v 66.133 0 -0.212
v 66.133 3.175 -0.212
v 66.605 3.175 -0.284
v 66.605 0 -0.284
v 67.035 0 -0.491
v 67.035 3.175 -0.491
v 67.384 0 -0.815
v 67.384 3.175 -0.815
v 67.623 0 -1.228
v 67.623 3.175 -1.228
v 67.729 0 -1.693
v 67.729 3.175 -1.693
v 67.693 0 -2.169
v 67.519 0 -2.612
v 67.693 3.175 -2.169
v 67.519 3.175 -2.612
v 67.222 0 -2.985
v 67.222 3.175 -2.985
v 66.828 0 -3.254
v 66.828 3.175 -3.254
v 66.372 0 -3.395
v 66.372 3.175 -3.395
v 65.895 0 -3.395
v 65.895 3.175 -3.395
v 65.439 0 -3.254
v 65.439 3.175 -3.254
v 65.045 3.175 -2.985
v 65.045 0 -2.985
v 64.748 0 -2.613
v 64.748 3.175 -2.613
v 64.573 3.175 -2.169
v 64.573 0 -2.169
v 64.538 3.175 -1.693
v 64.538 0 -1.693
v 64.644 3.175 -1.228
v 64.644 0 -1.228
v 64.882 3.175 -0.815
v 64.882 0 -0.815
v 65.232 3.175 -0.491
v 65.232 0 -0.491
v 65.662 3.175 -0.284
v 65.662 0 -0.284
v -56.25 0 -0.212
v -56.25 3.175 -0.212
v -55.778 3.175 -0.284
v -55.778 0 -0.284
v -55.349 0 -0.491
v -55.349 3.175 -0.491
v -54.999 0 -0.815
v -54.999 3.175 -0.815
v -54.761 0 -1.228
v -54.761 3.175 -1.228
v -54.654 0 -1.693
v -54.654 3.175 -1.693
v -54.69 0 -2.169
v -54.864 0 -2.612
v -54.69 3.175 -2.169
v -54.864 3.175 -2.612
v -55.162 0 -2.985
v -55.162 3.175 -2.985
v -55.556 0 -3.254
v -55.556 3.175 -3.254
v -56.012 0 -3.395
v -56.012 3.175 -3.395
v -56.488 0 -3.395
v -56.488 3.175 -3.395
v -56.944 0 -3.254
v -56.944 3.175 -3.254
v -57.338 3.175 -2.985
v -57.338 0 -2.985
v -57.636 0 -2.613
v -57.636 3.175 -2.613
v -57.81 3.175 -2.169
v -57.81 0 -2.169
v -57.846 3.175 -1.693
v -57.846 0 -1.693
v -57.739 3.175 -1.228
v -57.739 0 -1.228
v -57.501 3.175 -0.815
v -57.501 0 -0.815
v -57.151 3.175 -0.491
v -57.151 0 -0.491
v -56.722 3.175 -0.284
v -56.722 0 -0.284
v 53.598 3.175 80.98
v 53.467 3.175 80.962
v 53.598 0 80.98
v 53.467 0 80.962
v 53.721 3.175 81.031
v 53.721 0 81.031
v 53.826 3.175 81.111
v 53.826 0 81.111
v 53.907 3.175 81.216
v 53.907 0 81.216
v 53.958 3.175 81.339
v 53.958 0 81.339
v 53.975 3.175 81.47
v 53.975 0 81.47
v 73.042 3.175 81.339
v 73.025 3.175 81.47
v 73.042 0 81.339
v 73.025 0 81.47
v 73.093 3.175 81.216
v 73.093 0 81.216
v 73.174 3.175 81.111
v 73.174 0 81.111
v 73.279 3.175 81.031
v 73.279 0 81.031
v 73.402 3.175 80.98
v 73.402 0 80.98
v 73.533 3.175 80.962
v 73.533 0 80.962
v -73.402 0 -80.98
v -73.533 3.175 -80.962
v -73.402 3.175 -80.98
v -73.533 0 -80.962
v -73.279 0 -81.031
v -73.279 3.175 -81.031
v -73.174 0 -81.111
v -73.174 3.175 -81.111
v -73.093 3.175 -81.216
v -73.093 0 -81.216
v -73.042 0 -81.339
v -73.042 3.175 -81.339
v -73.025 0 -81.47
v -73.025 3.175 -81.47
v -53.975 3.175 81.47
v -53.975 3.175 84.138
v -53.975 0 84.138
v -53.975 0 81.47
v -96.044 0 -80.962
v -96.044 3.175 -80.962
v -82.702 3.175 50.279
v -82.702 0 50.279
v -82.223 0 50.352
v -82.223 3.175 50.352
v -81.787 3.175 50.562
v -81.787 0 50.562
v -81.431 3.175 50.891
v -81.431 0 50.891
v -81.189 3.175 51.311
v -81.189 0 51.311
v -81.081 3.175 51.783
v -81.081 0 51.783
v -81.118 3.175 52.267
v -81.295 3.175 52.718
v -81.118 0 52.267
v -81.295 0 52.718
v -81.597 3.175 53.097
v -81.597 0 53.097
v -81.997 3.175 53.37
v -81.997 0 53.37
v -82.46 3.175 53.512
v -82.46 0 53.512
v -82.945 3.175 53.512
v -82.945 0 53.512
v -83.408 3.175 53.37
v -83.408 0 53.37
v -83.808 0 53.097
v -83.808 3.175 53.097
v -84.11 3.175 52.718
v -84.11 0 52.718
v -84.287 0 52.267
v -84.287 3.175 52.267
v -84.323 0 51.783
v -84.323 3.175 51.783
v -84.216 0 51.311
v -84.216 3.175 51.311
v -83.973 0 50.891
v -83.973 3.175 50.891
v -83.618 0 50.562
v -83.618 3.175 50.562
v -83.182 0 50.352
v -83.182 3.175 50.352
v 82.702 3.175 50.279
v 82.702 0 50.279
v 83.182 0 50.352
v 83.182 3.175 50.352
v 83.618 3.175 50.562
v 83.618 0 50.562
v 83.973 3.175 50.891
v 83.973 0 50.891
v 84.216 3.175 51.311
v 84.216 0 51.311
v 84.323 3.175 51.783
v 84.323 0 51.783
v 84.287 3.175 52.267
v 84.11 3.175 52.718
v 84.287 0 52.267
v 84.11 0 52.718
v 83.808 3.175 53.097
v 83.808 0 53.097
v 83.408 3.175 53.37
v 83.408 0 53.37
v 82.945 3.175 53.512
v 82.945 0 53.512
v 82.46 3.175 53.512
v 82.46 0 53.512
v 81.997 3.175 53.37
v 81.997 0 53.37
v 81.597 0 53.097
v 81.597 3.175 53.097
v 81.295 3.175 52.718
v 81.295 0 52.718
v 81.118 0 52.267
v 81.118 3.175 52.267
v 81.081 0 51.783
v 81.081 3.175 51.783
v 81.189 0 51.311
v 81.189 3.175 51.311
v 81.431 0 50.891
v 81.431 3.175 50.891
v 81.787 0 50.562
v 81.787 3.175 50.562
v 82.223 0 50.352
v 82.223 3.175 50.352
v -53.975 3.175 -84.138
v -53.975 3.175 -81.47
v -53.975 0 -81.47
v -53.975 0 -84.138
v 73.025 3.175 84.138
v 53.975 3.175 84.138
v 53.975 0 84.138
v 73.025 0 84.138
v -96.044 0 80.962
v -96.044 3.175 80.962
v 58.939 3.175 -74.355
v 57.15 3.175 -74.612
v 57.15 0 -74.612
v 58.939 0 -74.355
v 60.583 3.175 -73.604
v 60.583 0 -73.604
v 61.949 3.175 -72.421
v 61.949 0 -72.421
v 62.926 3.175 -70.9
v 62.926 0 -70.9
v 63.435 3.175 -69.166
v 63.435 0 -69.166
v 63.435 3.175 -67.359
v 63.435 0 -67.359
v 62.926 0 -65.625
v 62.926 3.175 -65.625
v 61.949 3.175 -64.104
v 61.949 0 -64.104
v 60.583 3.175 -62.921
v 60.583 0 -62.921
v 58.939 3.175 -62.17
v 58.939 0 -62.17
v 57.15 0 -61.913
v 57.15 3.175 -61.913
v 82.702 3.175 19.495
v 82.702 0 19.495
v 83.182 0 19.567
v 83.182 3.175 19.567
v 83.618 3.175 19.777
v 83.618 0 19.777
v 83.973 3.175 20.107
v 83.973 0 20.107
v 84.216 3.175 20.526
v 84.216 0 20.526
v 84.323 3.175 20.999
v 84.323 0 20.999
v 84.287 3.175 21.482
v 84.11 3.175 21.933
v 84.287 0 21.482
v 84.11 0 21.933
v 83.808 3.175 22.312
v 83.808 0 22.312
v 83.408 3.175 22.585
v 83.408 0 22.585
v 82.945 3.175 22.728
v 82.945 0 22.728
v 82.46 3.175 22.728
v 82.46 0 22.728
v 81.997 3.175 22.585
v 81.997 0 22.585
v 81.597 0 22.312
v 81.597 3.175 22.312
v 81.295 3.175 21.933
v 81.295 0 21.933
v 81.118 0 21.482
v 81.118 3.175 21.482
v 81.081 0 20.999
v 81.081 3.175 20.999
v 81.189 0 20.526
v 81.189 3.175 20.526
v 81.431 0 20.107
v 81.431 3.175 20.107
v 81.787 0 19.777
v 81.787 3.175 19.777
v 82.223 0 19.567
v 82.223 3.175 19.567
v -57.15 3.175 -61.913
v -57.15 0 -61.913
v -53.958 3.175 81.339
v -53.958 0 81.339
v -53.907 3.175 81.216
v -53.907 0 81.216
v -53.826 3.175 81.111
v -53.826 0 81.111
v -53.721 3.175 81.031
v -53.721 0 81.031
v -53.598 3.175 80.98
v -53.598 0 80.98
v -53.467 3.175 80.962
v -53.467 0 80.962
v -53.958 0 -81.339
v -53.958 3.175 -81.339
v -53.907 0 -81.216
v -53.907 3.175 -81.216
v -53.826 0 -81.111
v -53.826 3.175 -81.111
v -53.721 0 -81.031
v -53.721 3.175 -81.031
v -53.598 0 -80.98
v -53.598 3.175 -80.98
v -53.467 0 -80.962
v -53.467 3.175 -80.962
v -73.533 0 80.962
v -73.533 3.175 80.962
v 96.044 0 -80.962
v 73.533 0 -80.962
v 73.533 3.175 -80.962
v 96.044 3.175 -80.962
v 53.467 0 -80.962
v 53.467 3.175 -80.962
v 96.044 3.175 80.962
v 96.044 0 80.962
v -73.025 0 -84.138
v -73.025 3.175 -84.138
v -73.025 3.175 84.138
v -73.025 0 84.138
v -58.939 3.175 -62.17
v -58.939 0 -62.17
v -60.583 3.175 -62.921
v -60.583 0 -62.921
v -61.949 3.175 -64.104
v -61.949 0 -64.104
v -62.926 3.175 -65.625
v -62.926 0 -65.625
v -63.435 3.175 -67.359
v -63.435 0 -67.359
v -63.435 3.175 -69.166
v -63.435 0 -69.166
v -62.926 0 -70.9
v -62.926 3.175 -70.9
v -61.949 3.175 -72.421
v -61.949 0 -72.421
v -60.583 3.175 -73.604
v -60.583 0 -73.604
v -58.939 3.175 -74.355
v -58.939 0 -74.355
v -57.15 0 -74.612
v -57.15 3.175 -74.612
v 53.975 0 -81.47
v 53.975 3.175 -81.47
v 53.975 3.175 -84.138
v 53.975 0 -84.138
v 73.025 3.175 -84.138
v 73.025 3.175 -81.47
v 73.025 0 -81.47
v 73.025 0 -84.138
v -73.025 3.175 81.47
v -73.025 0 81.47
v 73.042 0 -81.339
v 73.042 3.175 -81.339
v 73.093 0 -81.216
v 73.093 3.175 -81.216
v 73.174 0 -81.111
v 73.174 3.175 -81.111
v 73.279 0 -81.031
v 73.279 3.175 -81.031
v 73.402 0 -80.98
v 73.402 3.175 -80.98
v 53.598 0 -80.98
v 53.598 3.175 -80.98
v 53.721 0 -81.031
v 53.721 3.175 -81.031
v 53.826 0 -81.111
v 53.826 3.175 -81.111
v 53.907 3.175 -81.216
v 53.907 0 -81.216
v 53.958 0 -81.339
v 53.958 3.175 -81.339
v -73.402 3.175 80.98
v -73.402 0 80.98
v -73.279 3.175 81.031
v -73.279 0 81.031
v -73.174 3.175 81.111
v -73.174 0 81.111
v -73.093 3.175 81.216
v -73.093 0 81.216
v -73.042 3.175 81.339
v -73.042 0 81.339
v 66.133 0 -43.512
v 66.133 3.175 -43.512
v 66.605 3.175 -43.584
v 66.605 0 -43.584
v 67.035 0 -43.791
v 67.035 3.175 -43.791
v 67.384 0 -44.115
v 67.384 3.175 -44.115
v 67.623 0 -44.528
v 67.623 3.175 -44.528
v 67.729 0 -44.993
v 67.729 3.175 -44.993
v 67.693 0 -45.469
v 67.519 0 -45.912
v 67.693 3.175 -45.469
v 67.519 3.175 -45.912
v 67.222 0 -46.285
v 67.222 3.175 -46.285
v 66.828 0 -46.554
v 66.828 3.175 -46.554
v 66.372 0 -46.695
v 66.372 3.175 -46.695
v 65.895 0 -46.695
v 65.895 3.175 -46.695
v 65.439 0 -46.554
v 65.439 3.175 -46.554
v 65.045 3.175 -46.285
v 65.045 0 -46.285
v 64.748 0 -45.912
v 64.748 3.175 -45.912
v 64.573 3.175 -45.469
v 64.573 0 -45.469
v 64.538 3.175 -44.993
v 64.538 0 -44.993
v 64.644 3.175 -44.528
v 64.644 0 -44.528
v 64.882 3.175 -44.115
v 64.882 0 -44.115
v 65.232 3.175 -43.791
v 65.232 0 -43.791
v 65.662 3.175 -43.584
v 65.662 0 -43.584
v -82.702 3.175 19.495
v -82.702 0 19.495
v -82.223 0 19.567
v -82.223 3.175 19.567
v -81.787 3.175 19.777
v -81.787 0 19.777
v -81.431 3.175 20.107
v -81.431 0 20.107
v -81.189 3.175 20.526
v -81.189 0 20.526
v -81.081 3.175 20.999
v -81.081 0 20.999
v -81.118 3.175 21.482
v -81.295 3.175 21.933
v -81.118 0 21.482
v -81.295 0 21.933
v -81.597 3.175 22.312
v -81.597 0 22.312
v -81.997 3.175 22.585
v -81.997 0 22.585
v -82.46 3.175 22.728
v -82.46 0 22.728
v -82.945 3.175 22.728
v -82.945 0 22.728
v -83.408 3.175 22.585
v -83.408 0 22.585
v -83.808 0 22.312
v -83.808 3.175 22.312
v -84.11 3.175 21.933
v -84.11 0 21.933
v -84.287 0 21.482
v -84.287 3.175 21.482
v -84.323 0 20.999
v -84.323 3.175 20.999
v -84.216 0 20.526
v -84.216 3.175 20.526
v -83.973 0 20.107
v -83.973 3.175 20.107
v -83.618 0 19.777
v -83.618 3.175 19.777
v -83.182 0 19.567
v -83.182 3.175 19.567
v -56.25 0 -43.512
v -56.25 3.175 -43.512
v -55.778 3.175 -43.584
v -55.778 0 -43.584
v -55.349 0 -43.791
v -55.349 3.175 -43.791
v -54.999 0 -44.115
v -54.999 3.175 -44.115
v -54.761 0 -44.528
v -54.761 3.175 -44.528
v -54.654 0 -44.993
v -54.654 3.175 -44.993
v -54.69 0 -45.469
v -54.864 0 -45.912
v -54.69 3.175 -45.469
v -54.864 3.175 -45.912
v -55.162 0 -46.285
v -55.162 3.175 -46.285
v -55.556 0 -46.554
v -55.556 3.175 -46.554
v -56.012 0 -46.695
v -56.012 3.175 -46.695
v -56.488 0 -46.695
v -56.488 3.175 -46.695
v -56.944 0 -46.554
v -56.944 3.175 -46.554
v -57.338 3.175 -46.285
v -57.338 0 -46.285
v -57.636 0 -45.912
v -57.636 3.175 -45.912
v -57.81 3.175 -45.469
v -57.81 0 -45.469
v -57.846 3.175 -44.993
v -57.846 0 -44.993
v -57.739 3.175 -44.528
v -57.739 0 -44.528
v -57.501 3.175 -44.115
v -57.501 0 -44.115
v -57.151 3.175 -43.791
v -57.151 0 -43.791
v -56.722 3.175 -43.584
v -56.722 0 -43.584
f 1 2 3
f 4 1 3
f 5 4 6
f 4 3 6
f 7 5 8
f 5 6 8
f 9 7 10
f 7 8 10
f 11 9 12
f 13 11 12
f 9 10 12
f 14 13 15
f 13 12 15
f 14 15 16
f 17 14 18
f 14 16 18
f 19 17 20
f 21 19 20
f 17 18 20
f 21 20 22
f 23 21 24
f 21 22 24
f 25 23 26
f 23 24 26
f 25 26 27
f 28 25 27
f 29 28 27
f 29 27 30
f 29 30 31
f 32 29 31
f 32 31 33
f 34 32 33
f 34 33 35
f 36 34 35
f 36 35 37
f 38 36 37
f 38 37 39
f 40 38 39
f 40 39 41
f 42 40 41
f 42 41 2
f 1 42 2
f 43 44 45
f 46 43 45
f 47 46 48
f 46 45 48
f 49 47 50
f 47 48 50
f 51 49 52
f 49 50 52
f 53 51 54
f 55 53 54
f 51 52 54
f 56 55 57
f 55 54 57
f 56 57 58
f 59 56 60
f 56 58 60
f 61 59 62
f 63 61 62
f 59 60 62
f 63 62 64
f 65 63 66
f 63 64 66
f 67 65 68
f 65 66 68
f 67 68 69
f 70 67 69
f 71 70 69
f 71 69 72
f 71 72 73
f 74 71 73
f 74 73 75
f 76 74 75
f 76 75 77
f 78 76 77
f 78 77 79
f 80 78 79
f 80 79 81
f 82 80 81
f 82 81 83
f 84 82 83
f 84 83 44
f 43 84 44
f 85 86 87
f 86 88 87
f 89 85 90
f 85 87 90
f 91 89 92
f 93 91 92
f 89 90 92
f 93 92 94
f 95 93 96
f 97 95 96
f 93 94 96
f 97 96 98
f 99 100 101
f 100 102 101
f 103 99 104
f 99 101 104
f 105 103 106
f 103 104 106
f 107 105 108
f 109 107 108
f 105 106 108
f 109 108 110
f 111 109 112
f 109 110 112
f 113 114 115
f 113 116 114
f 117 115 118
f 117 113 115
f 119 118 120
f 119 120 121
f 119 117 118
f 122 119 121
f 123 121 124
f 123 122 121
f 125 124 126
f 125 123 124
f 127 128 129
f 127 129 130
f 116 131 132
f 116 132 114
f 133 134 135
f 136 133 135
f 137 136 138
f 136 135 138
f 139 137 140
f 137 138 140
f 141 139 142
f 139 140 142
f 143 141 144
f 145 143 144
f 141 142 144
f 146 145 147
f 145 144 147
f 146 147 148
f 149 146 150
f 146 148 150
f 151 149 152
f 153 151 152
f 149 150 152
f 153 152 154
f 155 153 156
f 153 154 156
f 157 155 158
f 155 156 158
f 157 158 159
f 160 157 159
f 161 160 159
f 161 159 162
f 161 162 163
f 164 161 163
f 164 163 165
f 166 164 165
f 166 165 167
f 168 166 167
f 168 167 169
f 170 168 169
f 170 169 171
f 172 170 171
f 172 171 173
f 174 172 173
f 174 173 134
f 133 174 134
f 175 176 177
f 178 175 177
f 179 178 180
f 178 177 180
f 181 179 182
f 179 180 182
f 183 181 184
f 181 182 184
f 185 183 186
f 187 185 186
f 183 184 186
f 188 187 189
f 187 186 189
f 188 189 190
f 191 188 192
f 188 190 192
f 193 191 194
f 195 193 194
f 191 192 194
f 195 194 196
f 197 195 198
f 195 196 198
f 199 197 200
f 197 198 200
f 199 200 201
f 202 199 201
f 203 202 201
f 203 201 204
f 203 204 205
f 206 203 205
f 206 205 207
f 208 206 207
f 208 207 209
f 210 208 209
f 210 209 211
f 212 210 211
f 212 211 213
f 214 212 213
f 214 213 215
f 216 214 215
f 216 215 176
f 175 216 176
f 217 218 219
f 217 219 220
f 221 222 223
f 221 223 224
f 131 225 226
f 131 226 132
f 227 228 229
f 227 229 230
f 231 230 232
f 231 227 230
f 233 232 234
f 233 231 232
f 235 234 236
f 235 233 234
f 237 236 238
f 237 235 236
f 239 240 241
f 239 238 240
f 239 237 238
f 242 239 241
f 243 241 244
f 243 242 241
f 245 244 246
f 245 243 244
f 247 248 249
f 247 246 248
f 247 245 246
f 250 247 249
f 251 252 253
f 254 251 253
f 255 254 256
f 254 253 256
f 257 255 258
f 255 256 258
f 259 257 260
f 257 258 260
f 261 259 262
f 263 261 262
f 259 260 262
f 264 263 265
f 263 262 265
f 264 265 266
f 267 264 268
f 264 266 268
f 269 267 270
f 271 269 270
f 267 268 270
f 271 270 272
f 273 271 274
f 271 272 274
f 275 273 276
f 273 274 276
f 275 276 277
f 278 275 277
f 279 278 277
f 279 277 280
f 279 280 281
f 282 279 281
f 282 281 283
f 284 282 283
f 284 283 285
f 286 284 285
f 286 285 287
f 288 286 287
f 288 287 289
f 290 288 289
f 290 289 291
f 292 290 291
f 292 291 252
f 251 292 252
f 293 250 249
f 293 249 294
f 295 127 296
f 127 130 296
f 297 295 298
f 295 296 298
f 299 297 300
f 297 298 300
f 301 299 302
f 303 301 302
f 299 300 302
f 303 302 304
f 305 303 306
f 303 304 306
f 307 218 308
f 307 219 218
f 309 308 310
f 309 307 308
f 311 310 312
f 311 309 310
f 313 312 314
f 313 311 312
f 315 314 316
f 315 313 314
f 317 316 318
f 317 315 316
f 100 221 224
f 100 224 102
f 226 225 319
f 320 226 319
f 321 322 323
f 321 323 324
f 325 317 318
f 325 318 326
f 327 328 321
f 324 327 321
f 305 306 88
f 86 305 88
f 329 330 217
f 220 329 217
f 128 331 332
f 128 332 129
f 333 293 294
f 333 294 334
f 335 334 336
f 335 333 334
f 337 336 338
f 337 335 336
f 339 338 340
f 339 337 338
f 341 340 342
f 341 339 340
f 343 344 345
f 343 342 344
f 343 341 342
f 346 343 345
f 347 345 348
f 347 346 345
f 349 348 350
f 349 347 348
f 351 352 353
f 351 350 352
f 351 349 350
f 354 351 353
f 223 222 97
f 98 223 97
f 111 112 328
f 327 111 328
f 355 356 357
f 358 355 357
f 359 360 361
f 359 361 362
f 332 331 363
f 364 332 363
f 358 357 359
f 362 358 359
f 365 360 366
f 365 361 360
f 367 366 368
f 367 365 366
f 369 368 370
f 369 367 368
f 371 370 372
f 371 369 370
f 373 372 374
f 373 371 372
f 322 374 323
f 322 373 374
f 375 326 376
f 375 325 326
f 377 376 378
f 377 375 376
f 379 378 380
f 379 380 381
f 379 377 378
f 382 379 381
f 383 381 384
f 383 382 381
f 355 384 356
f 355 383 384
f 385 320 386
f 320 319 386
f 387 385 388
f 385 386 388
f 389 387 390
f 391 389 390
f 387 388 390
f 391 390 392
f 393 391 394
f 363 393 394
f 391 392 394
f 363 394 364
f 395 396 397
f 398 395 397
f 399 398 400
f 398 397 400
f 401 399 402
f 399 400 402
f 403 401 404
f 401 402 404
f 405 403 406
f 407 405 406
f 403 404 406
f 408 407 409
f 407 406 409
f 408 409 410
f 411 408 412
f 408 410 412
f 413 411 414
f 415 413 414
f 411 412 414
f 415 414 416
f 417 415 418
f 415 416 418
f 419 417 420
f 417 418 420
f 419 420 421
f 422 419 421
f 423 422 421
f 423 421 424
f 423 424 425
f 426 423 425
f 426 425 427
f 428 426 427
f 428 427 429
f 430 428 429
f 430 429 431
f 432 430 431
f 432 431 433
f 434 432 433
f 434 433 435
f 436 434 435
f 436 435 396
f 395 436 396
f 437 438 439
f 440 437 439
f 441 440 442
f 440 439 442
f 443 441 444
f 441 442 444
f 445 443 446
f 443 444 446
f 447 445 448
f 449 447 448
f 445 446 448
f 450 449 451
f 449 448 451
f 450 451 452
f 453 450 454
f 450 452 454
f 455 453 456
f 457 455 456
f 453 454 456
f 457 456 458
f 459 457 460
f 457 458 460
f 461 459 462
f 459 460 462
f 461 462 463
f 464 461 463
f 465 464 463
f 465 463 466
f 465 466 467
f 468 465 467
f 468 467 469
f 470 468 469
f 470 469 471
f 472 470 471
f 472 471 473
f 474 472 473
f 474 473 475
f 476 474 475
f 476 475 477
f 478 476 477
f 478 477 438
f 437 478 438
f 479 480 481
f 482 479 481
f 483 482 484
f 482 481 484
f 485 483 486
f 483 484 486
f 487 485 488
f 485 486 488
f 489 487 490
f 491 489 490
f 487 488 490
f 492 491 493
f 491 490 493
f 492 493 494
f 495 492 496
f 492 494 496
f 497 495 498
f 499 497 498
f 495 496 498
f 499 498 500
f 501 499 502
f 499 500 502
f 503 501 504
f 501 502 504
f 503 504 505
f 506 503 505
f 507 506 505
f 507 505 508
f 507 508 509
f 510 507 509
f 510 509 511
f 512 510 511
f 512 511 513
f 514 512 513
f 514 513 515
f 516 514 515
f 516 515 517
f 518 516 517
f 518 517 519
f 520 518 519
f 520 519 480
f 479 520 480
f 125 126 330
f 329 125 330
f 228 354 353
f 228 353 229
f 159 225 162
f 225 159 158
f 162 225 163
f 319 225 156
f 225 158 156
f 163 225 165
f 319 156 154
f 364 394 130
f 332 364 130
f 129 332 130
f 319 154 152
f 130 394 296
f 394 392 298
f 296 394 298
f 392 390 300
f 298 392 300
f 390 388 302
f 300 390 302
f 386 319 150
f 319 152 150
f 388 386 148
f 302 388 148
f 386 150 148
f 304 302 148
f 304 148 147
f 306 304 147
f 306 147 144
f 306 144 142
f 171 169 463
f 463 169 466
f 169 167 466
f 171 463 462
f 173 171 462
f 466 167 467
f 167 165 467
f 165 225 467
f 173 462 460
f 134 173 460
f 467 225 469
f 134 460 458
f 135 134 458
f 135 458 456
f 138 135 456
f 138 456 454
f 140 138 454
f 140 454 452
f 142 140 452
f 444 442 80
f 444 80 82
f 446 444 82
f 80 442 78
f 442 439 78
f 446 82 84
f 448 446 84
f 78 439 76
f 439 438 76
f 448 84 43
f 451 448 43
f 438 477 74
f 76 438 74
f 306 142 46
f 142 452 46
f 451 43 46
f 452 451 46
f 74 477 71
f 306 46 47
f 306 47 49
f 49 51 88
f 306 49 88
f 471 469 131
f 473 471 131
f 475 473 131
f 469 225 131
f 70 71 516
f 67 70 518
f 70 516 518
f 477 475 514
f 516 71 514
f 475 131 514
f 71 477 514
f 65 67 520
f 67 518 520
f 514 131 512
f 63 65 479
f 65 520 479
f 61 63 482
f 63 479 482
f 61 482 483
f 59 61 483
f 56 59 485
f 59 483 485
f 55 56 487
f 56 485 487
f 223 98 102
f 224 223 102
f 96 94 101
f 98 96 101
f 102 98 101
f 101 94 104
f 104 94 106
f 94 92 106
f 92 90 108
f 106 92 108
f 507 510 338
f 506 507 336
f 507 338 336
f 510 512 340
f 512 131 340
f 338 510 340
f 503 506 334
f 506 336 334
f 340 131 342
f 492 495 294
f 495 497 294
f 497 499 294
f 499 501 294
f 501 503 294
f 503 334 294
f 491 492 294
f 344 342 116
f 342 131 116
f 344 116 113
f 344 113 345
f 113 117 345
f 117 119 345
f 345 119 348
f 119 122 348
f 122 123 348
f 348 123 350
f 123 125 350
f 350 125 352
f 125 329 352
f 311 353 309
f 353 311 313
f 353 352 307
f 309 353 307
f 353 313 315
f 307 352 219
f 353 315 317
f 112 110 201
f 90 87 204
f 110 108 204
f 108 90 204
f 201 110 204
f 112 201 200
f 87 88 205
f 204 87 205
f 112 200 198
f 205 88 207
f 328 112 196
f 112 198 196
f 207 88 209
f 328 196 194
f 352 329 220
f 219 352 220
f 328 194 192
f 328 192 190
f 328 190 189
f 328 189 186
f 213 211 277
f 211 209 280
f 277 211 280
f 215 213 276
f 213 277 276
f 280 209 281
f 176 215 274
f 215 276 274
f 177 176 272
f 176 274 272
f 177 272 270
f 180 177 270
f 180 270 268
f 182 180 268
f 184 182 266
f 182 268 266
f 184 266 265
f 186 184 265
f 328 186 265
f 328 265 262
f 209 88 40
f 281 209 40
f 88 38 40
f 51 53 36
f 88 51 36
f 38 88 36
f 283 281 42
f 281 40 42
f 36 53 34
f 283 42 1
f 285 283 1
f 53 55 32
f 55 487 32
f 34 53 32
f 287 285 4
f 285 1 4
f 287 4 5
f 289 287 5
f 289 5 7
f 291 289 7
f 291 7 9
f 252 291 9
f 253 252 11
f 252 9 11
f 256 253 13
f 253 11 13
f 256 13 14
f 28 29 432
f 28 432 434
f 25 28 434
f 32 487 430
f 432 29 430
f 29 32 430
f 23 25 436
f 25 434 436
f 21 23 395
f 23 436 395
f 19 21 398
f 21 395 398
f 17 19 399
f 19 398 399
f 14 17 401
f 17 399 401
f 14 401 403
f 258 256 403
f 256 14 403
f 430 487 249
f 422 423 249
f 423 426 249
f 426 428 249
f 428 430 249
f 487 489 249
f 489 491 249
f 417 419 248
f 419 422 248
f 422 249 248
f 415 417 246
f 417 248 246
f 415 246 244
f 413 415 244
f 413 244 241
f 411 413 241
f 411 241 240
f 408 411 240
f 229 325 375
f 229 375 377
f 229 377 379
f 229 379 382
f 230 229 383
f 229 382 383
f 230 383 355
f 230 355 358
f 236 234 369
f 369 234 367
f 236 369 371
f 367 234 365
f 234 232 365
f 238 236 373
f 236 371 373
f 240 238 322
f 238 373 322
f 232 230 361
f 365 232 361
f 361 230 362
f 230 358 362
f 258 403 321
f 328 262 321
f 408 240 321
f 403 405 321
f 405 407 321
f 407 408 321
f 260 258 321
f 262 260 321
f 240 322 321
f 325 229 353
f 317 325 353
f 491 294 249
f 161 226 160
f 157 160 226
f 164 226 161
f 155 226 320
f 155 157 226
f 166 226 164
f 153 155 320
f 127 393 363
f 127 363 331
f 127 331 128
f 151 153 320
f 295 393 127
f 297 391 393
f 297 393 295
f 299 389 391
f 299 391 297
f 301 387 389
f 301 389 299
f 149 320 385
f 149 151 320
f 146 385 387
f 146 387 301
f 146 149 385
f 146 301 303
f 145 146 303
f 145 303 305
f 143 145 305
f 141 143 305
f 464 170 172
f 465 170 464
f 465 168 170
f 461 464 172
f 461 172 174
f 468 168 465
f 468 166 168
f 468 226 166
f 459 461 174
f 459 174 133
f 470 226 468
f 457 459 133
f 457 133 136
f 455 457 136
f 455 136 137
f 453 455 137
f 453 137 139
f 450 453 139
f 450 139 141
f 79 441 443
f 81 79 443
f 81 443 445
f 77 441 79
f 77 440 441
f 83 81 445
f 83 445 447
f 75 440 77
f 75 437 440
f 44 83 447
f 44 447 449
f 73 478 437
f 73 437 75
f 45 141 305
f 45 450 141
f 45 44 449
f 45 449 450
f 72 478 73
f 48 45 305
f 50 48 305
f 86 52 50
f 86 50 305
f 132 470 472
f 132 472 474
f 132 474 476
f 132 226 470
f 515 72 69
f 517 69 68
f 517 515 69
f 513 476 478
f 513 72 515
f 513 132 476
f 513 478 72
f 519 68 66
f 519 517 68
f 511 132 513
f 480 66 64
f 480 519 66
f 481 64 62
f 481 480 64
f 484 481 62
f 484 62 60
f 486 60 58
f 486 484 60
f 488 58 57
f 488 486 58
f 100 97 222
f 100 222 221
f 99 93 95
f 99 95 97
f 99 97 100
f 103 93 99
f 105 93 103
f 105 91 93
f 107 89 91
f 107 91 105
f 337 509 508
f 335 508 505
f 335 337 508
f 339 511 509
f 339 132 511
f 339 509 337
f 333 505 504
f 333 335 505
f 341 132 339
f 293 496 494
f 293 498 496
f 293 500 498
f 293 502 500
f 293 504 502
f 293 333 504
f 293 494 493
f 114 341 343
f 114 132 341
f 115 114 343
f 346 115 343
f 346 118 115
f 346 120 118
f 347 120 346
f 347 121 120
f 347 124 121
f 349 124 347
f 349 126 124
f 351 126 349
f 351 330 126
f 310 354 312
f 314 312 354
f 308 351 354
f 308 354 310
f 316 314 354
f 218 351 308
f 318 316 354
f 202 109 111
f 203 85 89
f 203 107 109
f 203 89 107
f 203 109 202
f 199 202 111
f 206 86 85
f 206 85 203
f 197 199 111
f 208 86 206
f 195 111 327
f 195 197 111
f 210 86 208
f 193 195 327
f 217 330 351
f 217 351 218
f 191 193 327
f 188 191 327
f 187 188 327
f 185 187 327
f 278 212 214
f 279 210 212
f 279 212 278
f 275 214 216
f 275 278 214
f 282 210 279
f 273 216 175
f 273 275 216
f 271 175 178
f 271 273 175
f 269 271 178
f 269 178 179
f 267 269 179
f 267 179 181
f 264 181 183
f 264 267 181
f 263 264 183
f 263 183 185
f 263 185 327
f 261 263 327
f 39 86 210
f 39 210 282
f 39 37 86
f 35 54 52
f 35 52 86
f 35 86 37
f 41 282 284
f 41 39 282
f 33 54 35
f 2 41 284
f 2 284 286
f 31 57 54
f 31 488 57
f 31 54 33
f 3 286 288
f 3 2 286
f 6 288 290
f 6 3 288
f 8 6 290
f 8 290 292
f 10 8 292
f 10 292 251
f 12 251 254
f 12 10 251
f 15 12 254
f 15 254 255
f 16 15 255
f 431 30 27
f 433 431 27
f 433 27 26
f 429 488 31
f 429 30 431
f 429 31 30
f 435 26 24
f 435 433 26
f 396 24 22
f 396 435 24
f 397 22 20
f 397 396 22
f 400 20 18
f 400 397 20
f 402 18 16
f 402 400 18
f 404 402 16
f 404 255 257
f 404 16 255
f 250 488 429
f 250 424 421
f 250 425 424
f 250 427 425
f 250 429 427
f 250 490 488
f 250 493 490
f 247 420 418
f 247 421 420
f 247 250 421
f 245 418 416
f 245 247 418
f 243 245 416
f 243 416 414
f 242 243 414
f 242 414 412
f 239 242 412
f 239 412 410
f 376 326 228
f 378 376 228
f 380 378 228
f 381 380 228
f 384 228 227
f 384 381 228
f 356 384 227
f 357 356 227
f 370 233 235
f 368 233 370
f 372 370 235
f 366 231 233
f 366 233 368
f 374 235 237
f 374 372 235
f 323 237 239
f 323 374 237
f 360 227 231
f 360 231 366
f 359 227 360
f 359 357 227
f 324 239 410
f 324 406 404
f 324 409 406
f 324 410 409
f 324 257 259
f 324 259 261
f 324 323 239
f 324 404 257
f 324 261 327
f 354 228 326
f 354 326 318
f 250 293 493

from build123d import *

# Parameters (mm, degrees)
SKETCH1_W           = 192.0875
SKETCH1_H           = 161.925
BOSS_EXTRUDE1_DEPTH = 3.175
SKETCH2_W           = 19.05
SKETCH2_H           = 3.175
BOSS_EXTRUDE2_DEPTH = 3.175
CUT_EXTRUDE1_DEPTH  = 128.724709611
FILLET1_R           = 0.508
CUT_EXTRUDE2_REACH  = 129.725
SKETCH4_R           = 1.6256
CUT_EXTRUDE3_REACH  = 129.725
SKETCH5_R           = 1.6


with BuildPart() as part:
    # Sketch1 → Boss-Extrude1 (new body)
    with BuildSketch(Plane(origin=(0, 0, 0), x_dir=(1, 0, 0), z_dir=(0, 1, 0))):
        Rectangle(SKETCH1_W, SKETCH1_H)
    extrude(amount=BOSS_EXTRUDE1_DEPTH)

    # Sketch2 → Boss-Extrude2 (add)
    with BuildSketch(Plane(origin=(0, 3.175, 0), x_dir=(1, 0, 0), z_dir=(0, 1, 0))):
        with Locations((-63.5, 82.55)):
            Rectangle(SKETCH2_W, SKETCH2_H)
        with Locations((63.5, 82.55)):
            Rectangle(SKETCH2_W, SKETCH2_H)
        with Locations((-63.5, -82.55)):
            Rectangle(SKETCH2_W, SKETCH2_H)
        with Locations((63.5, -82.55)):
            Rectangle(SKETCH2_W, SKETCH2_H)
    extrude(amount=-BOSS_EXTRUDE2_DEPTH)

    # Sketch3 → Cut-Extrude1 (cut, through all)
    with BuildSketch(Plane(origin=(0, 3.175, 0), x_dir=(1, 0, 0), z_dir=(0, 1, 0))):
        with BuildLine():
            Line((-57.15, 74.6125), (57.15, 74.6125))
            ThreePointArc((57.15, 74.6125), (63.5, 68.2625), (57.15, 61.9125))
            Line((57.15, 61.9125), (-57.15, 61.9125))
            ThreePointArc((-57.15, 61.9125), (-63.5, 68.2625), (-57.15, 74.6125))
        make_face()
    extrude(amount=-CUT_EXTRUDE1_DEPTH, mode=Mode.SUBTRACT)

    # Fillet1
    fillet1_edges = [part.edges().sort_by_distance(p)[0] for p in [
        (73.025, 1.5875, 80.9625),
        (53.975, 1.5875, 80.9625),
        (-53.975, 1.5875, 80.9625),
        (-73.025, 1.5875, 80.9625),
        (53.975, 1.5875, -80.9625),
        (73.025, 1.5875, -80.9625),
        (-53.975, 1.5875, -80.9625),
        (-73.025, 1.5875, -80.9625),
    ]]
    fillet(fillet1_edges, radius=FILLET1_R)

    # Sketch4 → Cut-Extrude2 (cut, up to next)
    with BuildSketch(Plane.XZ, mode=Mode.PRIVATE) as cut_extrude2_sk1:
        with Locations(Location((-82.7024, 51.9049, 0), (0, 0, 270))):
            Circle(SKETCH4_R)
    cut_extrude2_tool1 = extrude(cut_extrude2_sk1.sketch, amount=-CUT_EXTRUDE2_REACH, mode=Mode.PRIVATE) & part.part
    # Sketch4 → Cut-Extrude2 (cut, up to next)
    with BuildSketch(Plane.XZ, mode=Mode.PRIVATE) as cut_extrude2_sk2:
        with Locations(Location((-82.7024, 21.1201, 0), (0, 0, 270))):
            Circle(SKETCH4_R)
    cut_extrude2_tool2 = extrude(cut_extrude2_sk2.sketch, amount=-CUT_EXTRUDE2_REACH, mode=Mode.PRIVATE) & part.part
    # Sketch4 → Cut-Extrude2 (cut, up to next)
    with BuildSketch(Plane.XZ, mode=Mode.PRIVATE) as cut_extrude2_sk3:
        with Locations(Location((82.7024, 21.1201, 0), (0, 0, 270))):
            Circle(SKETCH4_R)
    cut_extrude2_tool3 = extrude(cut_extrude2_sk3.sketch, amount=-CUT_EXTRUDE2_REACH, mode=Mode.PRIVATE) & part.part
    # Sketch4 → Cut-Extrude2 (cut, up to next)
    with BuildSketch(Plane.XZ, mode=Mode.PRIVATE) as cut_extrude2_sk4:
        with Locations(Location((82.7024, 51.9049, 0), (0, 0, 270))):
            Circle(SKETCH4_R)
    cut_extrude2_tool4 = extrude(cut_extrude2_sk4.sketch, amount=-CUT_EXTRUDE2_REACH, mode=Mode.PRIVATE) & part.part
    add(cut_extrude2_tool1.solids().sort_by_distance((-82.7024, 0, 51.9049))[0], mode=Mode.SUBTRACT)
    add(cut_extrude2_tool2.solids().sort_by_distance((-82.7024, 0, 21.1201))[0], mode=Mode.SUBTRACT)
    add(cut_extrude2_tool3.solids().sort_by_distance((82.7024, 0, 21.1201))[0], mode=Mode.SUBTRACT)
    add(cut_extrude2_tool4.solids().sort_by_distance((82.7024, 0, 51.9049))[0], mode=Mode.SUBTRACT)

    # Sketch5 → Cut-Extrude3 (cut, up to next)
    with BuildSketch(Plane(origin=(0, 3.175, 0), x_dir=(1, 0, 0), z_dir=(0, 1, 0)), mode=Mode.PRIVATE) as cut_extrude3_sk1:
        with Locations(Location((66.1333, 1.8125, 0), (0, 0, 270))):
            Circle(SKETCH5_R)
    cut_extrude3_tool1 = extrude(cut_extrude3_sk1.sketch, amount=-CUT_EXTRUDE3_REACH, mode=Mode.PRIVATE) & part.part
    # Sketch5 → Cut-Extrude3 (cut, up to next)
    with BuildSketch(Plane(origin=(0, 3.175, 0), x_dir=(1, 0, 0), z_dir=(0, 1, 0)), mode=Mode.PRIVATE) as cut_extrude3_sk2:
        with Locations(Location((66.1333, 45.1125, 0), (0, 0, 270))):
            Circle(SKETCH5_R)
    cut_extrude3_tool2 = extrude(cut_extrude3_sk2.sketch, amount=-CUT_EXTRUDE3_REACH, mode=Mode.PRIVATE) & part.part
    # Sketch5 → Cut-Extrude3 (cut, up to next)
    with BuildSketch(Plane(origin=(0, 3.175, 0), x_dir=(1, 0, 0), z_dir=(0, 1, 0)), mode=Mode.PRIVATE) as cut_extrude3_sk3:
        with Locations(Location((-56.25, 45.1125, 0), (0, 0, 270))):
            Circle(SKETCH5_R)
    cut_extrude3_tool3 = extrude(cut_extrude3_sk3.sketch, amount=-CUT_EXTRUDE3_REACH, mode=Mode.PRIVATE) & part.part
    # Sketch5 → Cut-Extrude3 (cut, up to next)
    with BuildSketch(Plane(origin=(0, 3.175, 0), x_dir=(1, 0, 0), z_dir=(0, 1, 0)), mode=Mode.PRIVATE) as cut_extrude3_sk4:
        with Locations(Location((-56.25, 1.8125, 0), (0, 0, 270))):
            Circle(SKETCH5_R)
    cut_extrude3_tool4 = extrude(cut_extrude3_sk4.sketch, amount=-CUT_EXTRUDE3_REACH, mode=Mode.PRIVATE) & part.part
    add(cut_extrude3_tool1.solids().sort_by_distance((66.1333, 3.175, -1.8125))[0], mode=Mode.SUBTRACT)
    add(cut_extrude3_tool2.solids().sort_by_distance((66.1333, 3.175, -45.1125))[0], mode=Mode.SUBTRACT)
    add(cut_extrude3_tool3.solids().sort_by_distance((-56.25, 3.175, -45.1125))[0], mode=Mode.SUBTRACT)
    add(cut_extrude3_tool4.solids().sort_by_distance((-56.25, 3.175, -1.8125))[0], mode=Mode.SUBTRACT)


solid = part.part
